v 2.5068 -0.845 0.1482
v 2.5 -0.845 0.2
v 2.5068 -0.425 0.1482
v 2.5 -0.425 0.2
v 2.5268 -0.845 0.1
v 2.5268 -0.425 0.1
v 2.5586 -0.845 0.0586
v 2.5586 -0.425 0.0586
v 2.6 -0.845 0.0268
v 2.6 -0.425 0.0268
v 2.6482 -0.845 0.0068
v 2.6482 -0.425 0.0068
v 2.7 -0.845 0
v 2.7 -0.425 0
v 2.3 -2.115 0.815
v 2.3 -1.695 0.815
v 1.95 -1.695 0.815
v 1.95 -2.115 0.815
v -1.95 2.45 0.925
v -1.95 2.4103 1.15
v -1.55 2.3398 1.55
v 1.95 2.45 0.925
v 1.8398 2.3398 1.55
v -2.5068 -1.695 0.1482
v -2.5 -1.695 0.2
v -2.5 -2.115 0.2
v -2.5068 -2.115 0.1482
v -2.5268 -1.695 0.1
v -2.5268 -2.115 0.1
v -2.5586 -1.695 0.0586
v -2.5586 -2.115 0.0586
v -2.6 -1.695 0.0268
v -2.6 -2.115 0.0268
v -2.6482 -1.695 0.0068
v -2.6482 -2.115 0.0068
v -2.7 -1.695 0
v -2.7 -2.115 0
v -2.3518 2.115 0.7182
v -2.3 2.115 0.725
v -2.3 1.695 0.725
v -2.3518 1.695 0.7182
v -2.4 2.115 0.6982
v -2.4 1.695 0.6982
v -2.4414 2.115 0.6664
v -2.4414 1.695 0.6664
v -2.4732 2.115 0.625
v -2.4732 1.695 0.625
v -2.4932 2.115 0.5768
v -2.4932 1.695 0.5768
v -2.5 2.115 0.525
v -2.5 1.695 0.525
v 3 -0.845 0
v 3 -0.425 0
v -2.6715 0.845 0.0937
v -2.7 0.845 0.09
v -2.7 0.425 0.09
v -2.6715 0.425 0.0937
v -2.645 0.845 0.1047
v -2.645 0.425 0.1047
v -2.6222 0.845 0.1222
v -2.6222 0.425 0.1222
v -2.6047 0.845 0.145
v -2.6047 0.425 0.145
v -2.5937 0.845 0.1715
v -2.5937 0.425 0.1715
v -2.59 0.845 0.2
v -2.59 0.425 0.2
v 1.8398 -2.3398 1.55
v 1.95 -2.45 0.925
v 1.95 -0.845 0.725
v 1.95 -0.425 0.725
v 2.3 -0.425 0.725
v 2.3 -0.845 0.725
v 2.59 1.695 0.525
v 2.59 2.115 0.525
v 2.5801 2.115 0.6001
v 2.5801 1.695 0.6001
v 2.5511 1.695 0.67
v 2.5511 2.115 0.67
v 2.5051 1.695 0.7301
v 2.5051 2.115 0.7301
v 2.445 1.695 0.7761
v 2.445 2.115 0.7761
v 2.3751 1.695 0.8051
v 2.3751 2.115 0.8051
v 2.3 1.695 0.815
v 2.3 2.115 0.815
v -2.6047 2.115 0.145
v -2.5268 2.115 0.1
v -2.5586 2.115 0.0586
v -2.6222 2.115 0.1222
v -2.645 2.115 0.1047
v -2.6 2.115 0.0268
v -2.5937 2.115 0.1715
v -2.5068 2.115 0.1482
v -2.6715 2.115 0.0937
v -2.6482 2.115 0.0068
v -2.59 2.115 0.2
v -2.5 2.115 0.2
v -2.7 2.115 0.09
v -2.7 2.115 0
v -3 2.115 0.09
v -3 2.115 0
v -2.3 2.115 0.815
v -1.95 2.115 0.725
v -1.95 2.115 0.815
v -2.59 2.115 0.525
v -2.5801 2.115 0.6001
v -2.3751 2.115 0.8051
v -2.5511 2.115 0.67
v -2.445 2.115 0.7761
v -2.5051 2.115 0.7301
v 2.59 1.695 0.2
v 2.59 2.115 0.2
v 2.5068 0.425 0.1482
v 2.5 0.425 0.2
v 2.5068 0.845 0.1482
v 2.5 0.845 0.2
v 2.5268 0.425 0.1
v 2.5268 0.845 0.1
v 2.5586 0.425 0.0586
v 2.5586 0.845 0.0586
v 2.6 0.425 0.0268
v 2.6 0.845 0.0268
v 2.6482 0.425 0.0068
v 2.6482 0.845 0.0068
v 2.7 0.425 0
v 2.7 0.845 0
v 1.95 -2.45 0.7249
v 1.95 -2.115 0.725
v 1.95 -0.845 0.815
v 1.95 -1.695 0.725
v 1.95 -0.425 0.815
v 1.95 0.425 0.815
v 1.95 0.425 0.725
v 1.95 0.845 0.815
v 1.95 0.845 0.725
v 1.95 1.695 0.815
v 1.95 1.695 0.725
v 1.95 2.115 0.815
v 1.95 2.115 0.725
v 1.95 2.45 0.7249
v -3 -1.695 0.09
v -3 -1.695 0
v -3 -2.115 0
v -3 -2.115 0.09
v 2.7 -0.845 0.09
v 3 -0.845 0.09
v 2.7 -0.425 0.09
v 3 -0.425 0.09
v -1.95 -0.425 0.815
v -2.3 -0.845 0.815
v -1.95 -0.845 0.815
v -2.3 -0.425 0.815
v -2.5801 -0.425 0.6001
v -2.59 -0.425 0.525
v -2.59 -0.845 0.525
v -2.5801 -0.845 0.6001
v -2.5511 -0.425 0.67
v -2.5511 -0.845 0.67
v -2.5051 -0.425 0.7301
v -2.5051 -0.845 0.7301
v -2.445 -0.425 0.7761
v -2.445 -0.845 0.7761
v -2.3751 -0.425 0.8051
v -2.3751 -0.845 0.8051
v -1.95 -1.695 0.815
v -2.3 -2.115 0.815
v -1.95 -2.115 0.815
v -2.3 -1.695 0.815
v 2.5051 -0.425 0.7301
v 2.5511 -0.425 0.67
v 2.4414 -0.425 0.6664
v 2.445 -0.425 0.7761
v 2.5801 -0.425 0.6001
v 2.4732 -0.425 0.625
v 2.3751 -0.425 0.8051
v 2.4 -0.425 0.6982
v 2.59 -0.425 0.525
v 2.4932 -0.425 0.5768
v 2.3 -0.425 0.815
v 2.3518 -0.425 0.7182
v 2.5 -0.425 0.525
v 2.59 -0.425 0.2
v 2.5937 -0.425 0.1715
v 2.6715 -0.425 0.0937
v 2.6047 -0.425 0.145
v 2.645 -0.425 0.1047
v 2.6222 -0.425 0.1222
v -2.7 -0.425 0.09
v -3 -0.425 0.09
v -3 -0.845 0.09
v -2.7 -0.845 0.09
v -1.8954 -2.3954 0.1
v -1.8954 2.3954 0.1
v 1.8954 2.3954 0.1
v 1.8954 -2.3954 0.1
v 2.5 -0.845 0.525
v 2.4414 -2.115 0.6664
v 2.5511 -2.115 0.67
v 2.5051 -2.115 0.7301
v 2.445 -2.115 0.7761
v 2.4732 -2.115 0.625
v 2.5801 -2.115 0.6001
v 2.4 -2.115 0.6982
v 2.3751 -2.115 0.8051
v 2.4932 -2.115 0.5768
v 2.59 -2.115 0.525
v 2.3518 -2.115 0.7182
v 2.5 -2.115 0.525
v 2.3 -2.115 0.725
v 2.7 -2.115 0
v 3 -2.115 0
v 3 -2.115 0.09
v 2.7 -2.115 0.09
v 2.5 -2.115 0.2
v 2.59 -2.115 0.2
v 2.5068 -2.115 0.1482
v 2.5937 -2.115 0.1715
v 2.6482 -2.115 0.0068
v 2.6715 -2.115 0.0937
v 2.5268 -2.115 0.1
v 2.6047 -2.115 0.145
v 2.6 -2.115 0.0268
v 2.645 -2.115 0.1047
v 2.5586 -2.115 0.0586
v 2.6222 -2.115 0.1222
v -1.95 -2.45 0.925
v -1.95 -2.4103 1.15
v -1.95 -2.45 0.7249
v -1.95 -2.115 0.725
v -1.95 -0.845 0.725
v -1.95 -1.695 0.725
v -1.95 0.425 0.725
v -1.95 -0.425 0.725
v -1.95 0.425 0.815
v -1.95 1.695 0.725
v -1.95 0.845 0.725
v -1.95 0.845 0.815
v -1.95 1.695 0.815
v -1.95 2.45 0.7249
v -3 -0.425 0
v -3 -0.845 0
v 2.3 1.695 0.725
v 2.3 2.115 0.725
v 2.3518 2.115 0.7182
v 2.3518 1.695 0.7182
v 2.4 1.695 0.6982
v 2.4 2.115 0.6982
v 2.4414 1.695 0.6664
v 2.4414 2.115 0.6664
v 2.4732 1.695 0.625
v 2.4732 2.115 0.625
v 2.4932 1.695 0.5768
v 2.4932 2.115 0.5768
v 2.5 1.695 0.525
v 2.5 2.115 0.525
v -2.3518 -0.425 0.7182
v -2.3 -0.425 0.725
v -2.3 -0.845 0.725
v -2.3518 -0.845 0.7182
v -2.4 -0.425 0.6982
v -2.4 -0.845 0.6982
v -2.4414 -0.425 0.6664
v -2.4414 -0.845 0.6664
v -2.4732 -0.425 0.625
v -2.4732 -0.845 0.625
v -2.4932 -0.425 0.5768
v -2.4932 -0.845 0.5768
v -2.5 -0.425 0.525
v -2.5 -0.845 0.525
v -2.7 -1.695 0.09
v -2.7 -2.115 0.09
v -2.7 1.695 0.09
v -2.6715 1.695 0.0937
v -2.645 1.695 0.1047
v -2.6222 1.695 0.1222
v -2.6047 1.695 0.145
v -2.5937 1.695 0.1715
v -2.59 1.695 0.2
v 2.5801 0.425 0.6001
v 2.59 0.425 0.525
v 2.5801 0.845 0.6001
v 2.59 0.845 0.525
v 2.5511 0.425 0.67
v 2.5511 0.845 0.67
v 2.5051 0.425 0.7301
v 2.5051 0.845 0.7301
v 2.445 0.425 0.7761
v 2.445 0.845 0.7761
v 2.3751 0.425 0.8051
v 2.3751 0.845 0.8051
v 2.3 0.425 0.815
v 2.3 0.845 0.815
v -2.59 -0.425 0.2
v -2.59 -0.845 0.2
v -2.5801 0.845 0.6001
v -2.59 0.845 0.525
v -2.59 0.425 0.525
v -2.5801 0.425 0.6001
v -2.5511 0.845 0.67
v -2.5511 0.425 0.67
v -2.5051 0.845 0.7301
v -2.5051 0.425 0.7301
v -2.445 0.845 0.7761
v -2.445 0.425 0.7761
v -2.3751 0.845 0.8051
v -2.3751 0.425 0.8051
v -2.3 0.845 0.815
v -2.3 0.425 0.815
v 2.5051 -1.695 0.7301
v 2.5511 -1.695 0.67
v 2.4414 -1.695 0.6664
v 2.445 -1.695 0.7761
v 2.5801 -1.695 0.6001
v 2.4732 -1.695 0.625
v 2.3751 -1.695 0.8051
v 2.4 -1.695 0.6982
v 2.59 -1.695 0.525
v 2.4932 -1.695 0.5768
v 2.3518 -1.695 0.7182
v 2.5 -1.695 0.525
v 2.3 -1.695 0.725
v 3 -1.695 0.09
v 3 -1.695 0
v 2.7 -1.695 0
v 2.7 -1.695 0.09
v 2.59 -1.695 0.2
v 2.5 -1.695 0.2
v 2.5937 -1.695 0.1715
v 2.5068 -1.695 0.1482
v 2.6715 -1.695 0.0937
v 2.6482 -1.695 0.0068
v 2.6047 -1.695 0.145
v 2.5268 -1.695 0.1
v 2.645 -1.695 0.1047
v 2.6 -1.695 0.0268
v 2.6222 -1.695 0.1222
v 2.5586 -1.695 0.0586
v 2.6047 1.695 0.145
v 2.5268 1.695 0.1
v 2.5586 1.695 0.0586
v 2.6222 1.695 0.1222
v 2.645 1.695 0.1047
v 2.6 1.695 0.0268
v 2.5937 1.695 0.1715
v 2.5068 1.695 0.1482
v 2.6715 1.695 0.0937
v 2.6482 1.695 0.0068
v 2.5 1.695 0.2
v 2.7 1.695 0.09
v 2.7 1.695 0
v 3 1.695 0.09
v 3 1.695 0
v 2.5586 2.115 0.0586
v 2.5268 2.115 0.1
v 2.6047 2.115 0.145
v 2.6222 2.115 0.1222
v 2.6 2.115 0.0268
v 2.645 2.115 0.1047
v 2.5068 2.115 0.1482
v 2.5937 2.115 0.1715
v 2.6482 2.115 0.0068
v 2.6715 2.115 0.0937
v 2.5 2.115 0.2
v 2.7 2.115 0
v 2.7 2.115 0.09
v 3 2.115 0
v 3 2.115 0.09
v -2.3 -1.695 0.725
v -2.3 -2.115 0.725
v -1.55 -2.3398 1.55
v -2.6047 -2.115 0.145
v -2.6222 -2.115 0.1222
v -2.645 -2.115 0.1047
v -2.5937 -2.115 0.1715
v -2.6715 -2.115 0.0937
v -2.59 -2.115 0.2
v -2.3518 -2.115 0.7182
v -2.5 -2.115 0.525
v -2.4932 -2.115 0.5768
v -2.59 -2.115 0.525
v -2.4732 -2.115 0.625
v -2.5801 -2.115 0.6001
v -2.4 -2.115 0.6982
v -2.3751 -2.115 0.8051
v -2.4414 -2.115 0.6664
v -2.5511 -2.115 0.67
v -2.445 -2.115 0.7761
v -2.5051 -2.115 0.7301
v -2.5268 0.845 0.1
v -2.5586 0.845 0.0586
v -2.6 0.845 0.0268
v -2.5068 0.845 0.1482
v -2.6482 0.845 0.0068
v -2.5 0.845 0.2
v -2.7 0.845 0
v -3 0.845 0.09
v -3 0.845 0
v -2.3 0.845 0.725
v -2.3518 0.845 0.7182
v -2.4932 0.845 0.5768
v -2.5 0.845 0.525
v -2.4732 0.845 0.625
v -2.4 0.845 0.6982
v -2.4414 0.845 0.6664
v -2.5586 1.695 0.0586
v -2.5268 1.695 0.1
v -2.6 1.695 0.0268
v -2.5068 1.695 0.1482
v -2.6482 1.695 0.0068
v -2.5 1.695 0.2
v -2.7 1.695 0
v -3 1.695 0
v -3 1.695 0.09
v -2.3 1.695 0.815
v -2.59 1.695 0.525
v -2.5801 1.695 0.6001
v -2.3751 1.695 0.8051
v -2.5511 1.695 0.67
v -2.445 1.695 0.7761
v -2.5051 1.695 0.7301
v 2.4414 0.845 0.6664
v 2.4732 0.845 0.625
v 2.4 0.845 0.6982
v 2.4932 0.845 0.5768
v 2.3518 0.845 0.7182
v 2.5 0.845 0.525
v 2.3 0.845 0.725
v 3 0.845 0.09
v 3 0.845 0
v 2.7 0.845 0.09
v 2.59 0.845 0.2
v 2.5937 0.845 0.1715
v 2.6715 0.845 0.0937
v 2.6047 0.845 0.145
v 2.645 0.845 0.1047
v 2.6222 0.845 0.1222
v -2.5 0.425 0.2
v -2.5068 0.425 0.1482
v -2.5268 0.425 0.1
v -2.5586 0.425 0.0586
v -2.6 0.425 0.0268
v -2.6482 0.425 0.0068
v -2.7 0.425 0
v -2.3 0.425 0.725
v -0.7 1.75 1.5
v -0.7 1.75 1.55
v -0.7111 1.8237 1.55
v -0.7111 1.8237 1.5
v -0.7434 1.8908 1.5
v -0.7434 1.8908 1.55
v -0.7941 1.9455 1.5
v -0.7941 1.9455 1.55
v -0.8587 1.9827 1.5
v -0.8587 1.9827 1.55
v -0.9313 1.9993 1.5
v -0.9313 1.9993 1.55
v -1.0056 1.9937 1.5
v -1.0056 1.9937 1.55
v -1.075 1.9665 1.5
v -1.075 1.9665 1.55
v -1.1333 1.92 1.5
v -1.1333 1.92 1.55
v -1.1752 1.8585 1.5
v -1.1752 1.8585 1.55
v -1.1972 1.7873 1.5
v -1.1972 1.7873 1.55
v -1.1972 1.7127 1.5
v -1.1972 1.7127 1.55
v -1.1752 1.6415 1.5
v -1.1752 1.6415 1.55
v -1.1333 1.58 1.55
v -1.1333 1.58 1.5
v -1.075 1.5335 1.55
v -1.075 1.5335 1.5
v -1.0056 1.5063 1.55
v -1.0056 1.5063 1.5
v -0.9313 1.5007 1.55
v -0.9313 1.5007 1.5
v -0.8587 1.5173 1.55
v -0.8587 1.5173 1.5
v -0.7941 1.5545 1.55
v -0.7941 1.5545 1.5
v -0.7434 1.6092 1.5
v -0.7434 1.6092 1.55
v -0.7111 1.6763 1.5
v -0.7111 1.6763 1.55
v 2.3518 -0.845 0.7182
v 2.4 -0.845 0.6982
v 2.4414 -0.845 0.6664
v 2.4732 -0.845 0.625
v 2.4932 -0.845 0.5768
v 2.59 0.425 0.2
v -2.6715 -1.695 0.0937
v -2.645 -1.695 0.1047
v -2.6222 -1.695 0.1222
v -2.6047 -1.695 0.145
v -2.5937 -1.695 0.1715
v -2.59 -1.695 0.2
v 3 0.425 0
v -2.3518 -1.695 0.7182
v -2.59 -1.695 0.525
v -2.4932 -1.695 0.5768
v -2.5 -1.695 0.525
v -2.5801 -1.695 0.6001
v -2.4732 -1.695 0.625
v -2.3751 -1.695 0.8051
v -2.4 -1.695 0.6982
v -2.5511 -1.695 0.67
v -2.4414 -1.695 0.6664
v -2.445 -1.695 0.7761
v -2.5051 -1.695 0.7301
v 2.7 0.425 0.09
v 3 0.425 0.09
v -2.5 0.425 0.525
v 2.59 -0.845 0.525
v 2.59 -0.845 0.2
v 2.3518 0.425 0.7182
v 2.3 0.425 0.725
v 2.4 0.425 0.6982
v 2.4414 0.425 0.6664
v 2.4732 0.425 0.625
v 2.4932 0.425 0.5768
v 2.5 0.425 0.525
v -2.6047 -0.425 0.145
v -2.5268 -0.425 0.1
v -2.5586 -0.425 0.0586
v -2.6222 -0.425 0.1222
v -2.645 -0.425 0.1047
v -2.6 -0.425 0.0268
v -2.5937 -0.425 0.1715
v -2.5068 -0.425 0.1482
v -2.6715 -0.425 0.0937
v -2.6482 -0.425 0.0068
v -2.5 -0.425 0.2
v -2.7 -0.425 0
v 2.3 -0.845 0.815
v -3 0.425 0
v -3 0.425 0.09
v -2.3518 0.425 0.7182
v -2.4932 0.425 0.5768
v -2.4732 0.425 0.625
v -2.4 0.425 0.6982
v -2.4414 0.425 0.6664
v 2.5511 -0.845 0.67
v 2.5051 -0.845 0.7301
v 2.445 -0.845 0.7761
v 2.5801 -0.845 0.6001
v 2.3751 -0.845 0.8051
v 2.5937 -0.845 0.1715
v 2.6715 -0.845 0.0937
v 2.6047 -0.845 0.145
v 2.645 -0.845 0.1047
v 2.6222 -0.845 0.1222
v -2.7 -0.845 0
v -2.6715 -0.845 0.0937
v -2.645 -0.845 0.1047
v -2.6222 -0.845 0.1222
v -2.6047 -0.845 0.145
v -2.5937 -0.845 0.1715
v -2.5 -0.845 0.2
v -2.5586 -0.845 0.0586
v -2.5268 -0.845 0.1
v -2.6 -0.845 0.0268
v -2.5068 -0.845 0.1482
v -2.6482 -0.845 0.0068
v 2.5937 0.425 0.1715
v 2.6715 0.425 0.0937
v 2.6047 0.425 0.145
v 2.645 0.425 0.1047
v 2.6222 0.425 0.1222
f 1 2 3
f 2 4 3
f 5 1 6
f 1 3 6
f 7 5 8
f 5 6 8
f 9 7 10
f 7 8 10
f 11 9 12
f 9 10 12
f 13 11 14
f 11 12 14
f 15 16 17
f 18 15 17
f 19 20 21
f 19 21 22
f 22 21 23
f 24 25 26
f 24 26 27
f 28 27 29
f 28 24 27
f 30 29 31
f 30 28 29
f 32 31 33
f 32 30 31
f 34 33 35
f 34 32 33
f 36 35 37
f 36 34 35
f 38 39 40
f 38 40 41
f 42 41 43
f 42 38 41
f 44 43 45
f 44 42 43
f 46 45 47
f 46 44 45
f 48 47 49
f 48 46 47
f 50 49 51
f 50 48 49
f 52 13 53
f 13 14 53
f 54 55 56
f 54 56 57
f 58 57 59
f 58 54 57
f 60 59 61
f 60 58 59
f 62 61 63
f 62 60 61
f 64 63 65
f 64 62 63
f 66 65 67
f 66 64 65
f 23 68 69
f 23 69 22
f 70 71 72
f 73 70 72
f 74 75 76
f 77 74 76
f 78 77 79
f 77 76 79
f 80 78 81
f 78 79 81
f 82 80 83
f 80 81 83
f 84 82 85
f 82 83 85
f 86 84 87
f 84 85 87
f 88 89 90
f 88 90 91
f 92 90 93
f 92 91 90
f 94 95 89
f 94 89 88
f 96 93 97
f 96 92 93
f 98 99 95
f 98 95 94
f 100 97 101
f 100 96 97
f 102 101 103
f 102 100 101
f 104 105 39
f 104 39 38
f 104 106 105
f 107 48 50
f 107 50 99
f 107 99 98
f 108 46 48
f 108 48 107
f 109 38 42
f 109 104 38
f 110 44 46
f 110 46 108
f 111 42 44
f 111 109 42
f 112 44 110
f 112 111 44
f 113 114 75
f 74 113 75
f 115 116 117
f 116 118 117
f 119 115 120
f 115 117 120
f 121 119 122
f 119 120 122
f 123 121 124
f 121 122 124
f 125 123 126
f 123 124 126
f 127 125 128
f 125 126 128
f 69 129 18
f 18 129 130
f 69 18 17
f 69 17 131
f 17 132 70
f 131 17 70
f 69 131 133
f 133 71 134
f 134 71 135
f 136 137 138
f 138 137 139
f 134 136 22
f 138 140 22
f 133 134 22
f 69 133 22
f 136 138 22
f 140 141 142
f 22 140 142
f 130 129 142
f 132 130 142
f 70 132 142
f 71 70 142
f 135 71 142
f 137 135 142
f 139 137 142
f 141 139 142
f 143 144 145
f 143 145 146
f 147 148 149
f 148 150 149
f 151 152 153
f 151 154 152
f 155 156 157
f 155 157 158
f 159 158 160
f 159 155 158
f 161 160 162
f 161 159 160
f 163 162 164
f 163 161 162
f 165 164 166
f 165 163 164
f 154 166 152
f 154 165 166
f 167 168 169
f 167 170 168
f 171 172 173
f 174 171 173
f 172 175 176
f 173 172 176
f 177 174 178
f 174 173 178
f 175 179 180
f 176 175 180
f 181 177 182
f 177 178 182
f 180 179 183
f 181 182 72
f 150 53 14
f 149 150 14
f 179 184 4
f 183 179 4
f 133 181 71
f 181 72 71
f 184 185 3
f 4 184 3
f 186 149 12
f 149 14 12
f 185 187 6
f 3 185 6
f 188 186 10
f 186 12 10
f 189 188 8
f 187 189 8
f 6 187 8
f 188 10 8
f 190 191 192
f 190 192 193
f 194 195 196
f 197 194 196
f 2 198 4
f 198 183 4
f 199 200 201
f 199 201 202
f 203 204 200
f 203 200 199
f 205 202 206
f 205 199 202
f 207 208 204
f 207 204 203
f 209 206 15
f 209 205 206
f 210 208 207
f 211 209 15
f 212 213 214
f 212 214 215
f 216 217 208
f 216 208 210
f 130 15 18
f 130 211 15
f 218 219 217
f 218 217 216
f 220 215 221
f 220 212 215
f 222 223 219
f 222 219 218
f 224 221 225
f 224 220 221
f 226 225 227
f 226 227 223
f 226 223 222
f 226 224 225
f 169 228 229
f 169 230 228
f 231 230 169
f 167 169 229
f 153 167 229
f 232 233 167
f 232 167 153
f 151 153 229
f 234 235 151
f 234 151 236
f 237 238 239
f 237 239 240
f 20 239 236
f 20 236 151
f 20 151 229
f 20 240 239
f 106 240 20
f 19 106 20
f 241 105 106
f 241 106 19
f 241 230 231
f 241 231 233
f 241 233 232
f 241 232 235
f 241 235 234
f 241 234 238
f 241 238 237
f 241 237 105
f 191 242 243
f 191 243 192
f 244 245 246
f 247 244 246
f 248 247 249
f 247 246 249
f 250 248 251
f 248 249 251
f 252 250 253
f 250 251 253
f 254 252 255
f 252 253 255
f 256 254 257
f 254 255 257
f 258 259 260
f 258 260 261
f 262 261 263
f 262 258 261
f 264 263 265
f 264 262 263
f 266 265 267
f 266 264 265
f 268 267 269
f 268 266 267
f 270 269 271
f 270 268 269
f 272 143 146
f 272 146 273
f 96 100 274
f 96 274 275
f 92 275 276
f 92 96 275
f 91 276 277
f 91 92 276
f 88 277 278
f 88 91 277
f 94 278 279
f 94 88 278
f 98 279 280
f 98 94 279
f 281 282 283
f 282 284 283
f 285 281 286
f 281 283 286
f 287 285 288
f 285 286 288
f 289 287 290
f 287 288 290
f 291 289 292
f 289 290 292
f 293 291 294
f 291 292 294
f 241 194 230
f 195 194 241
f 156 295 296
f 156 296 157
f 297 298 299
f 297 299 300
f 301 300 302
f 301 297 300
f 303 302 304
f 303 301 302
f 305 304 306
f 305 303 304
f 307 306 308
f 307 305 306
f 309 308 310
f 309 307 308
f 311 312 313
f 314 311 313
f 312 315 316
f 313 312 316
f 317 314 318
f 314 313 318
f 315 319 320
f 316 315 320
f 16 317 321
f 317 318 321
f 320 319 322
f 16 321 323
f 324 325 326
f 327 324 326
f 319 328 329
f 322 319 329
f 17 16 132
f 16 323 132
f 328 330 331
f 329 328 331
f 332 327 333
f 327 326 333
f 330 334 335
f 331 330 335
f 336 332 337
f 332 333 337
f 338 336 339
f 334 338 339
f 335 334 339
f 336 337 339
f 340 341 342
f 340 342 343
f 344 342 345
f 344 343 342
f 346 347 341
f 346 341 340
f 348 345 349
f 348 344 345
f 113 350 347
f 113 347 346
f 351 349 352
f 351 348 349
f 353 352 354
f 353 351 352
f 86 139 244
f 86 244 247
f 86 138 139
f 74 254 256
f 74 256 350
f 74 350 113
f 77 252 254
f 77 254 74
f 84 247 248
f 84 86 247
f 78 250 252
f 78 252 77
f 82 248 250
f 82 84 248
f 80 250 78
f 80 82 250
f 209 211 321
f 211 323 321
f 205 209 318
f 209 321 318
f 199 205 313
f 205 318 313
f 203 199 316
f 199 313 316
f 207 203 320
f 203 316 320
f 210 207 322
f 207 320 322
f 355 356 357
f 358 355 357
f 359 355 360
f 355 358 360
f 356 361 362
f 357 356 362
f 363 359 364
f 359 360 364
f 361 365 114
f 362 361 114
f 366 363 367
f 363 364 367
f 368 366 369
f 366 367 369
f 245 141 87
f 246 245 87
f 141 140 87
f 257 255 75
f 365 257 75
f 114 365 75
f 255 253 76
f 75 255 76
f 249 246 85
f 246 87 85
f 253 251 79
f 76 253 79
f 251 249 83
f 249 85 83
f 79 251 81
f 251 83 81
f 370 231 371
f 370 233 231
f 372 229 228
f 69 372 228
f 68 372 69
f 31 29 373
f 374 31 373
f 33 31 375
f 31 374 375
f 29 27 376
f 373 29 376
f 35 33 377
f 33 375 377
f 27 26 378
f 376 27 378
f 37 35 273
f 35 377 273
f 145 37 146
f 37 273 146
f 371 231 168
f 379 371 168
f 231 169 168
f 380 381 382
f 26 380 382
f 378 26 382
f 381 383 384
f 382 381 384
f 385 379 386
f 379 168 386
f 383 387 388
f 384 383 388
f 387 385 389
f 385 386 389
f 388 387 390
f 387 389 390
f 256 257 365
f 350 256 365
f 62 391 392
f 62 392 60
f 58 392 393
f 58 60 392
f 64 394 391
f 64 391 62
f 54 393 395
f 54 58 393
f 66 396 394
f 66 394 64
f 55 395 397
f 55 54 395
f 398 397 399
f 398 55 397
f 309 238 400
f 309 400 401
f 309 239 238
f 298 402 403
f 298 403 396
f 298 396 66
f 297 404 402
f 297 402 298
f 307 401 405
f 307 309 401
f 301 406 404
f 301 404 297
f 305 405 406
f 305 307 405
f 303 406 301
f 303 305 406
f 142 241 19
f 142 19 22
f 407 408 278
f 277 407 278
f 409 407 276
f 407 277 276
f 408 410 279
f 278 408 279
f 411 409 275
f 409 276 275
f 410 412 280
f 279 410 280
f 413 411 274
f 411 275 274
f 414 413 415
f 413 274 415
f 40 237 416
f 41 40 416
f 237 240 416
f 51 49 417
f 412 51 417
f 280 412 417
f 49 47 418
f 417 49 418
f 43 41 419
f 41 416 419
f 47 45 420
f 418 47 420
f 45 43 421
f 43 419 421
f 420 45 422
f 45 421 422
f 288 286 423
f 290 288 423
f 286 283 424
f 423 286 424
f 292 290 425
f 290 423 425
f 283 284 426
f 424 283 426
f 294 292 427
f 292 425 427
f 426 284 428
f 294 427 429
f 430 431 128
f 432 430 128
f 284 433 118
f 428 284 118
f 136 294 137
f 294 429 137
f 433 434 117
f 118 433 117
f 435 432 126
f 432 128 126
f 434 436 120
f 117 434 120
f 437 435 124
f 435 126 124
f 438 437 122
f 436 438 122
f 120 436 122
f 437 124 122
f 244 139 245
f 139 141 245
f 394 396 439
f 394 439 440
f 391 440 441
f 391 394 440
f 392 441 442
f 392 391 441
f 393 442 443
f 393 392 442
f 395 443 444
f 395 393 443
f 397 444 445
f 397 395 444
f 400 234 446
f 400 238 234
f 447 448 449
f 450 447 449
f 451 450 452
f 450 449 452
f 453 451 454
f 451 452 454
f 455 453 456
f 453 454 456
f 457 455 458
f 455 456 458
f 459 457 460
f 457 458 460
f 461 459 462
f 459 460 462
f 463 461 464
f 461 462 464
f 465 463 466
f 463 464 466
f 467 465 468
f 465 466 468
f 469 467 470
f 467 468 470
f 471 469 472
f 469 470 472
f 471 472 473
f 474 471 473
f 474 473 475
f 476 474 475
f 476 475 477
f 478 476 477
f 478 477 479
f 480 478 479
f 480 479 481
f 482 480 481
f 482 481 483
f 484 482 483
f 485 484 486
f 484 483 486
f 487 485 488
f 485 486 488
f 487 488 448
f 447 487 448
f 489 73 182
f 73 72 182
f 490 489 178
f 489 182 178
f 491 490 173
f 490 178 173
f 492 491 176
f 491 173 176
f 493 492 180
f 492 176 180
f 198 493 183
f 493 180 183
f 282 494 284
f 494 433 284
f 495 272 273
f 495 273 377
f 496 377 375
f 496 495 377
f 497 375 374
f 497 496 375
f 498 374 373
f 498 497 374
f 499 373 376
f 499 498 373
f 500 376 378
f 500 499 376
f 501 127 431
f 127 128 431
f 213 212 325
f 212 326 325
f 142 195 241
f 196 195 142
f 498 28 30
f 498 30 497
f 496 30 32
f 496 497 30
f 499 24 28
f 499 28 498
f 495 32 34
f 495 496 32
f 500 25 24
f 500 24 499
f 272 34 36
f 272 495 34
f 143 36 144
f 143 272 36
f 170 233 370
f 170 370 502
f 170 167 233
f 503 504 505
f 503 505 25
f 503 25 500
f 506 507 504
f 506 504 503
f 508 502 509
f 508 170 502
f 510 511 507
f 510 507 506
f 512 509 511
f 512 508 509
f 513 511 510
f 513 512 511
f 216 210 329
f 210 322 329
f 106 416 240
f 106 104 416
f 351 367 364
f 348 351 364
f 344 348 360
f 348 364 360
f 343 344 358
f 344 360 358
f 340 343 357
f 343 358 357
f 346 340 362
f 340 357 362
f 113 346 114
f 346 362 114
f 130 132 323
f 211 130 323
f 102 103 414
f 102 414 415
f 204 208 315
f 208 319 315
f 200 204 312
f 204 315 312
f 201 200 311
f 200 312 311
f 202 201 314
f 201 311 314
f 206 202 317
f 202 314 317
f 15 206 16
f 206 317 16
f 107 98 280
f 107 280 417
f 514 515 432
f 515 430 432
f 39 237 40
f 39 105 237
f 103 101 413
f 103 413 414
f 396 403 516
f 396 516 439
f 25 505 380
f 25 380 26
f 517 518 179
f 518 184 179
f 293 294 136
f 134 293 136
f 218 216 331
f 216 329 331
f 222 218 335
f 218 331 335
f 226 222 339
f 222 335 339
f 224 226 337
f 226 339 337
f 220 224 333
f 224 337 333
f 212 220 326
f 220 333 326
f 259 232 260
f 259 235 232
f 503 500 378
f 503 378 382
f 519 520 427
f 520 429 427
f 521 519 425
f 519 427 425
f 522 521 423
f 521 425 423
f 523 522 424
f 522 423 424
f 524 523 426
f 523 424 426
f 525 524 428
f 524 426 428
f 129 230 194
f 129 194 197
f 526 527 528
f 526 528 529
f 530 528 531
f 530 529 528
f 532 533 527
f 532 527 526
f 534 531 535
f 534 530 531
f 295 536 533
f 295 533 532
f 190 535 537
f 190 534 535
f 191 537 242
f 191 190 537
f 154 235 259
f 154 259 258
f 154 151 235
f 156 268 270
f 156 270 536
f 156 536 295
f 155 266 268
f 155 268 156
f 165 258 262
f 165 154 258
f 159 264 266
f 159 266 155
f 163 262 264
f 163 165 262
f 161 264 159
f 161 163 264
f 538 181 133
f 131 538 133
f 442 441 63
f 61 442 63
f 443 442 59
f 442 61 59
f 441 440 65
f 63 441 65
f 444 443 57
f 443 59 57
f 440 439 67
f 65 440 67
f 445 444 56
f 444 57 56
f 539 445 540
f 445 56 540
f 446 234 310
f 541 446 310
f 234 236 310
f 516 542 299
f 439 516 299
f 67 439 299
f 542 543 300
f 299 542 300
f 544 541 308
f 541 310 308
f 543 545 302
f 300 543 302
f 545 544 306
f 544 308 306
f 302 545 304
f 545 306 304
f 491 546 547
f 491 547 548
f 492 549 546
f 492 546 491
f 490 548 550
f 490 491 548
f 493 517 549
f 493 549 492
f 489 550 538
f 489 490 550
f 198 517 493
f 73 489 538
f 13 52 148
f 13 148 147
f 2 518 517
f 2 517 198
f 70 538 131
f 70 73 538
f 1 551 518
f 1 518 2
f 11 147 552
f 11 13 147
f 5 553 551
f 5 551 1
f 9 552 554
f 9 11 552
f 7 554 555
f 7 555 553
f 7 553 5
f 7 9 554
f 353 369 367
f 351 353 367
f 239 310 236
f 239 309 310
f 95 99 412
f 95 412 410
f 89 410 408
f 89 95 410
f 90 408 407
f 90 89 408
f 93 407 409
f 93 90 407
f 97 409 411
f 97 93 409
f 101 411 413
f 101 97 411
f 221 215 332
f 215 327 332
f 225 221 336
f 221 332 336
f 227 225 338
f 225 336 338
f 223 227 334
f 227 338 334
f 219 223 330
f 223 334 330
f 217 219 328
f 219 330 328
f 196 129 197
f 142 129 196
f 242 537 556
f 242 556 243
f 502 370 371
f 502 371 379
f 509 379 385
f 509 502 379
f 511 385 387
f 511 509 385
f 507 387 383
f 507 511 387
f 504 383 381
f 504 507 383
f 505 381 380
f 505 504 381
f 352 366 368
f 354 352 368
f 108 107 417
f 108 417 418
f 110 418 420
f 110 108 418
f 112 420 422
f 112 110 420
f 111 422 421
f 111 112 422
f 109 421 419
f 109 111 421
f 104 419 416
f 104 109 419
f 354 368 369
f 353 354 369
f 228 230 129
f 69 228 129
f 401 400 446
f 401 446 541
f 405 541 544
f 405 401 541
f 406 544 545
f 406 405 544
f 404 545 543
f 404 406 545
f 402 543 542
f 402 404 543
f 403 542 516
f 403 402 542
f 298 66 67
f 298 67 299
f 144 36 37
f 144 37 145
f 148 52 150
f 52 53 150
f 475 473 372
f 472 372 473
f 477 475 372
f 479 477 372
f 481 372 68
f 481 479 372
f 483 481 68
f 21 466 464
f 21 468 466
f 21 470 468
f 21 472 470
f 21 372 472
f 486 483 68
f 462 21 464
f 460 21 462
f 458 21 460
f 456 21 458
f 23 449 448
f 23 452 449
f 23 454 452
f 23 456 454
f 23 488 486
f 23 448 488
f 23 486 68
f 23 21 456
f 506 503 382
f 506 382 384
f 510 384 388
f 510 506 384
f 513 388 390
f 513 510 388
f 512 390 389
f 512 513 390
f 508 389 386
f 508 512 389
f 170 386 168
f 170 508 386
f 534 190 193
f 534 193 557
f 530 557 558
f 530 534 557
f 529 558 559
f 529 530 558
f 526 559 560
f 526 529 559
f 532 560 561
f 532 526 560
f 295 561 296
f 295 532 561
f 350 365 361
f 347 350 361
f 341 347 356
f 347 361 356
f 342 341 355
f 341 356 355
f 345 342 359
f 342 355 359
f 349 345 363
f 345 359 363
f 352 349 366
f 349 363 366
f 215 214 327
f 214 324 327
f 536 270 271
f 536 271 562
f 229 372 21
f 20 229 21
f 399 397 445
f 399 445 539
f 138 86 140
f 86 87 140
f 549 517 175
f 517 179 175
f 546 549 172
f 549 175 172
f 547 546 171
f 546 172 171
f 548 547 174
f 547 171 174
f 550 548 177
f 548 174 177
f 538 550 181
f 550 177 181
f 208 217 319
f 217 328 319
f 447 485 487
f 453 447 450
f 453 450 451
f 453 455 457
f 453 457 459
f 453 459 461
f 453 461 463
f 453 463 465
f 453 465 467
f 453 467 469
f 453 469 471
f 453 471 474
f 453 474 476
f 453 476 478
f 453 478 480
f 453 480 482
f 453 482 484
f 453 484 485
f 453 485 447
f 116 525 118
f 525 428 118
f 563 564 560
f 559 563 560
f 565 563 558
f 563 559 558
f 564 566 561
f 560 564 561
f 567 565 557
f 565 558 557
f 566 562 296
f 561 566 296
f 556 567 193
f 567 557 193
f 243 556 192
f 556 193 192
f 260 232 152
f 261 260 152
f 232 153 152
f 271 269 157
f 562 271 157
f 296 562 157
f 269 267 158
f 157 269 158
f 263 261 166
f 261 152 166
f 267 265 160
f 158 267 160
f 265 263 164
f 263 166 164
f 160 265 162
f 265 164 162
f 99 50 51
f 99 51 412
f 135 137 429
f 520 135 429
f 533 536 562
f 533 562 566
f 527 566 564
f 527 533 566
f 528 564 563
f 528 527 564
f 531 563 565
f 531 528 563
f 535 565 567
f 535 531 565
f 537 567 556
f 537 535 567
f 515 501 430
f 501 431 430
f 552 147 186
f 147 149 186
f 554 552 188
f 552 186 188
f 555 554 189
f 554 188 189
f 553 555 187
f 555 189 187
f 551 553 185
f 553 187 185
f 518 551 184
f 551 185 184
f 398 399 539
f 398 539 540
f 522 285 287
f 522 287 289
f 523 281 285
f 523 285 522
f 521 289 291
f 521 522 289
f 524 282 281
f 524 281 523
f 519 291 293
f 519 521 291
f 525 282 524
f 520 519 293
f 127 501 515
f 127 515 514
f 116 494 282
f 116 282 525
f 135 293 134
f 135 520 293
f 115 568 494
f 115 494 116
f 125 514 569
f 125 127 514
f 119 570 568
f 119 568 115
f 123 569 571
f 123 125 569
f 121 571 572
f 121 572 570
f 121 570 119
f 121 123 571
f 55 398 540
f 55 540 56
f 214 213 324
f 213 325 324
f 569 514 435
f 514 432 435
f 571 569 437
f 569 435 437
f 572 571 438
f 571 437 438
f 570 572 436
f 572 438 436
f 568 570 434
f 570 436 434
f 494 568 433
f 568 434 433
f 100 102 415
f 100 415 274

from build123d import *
from OCP.BRepFilletAPI import BRepFilletAPI_MakeChamfer

# Parameters (mm, degrees)
ESQUISSE2_W              = 3.9
ESQUISSE2_H              = 4.9
CORP_DEPTH               = 1.45
PIN_1_DEPTH              = 0.21
R_P_TITION_PIN_1_4_COUNT = 4
R_P_TITION_PIN_1_4_PITCH = 1.27
SYM_TRIE1_COPY_1_DEPTH   = 0.21
SYM_TRIE1_COPY_2_DEPTH   = 0.21
SYM_TRIE1_COPY_3_DEPTH   = 0.21
CHANFREIN4_SIZE          = 0.625
CHANFREIN4_SIZE2         = 0.110204363
CHANFREIN5_SIZE          = 0.625
CHANFREIN5_SIZE_2        = 0.054680415
ESQUISSE8_R              = 0.25
ENL_V_MAT_EXTRU_1_DEPTH  = 0.05
CHANFREIN7_SIZE          = 0.4


with BuildPart() as part:
    # Esquisse2 → corp (new body)
    with BuildSketch(Plane.XY.offset(0.1)):
        Rectangle(ESQUISSE2_W, ESQUISSE2_H)
    extrude(amount=CORP_DEPTH)

    # Esquisse6 → pin 1 (add, symmetric)
    with BuildSketch(Plane(origin=(0, 1.905, 0), x_dir=(-1, 0, 0), z_dir=(0, 1, 0))):
        with BuildLine():
            Line((1.95, 0.725), (2.3, 0.725))
            ThreePointArc((2.3, 0.725), (2.441421356, 0.666421356), (2.5, 0.525))
            Line((2.5, 0.525), (2.5, 0.2))
            ThreePointArc((2.5, 0.2), (2.558578644, 0.058578644), (2.7, 0))
            Line((2.7, 0), (3, 0))
            Line((3, 0), (3, 0.09))
            Line((3, 0.09), (2.7, 0.09))
            ThreePointArc((2.7, 0.09), (2.622218254, 0.122218254), (2.59, 0.2))
            Line((2.59, 0.2), (2.59, 0.525))
            ThreePointArc((2.59, 0.525), (2.505060967, 0.730060967), (2.3, 0.815))
            Line((2.3, 0.815), (1.95, 0.815))
            Line((1.95, 0.815), (1.95, 0.725))
        make_face()
    pin_1 = extrude(amount=PIN_1_DEPTH, both=True)

    # Répétition pin 1-4: pin 1 ×4
    with Locations(*[(0, -i * R_P_TITION_PIN_1_4_PITCH, 0) for i in range(1, R_P_TITION_PIN_1_4_COUNT)]):
        add(pin_1)

    # Symétrie1: pin 1 across plane
    add(pin_1.mirror(Plane(origin=(0, 0, 0), x_dir=(0, 0, 1), z_dir=(1, 0, 0))))

    # Symétrie1 copy 1 sketch → Symétrie1 copy 1 (add, symmetric)
    with BuildSketch(Plane(origin=(0, 0.635, 0), x_dir=(1, 0, 0), z_dir=(0, 1, 0))):
        with BuildLine():
            Line((1.95, -0.725), (2.3, -0.725))
            ThreePointArc((2.3, -0.725), (2.441421356, -0.666421356), (2.5, -0.525))
            Line((2.5, -0.525), (2.5, -0.2))
            ThreePointArc((2.5, -0.2), (2.558578644, -0.058578644), (2.7, 0))
            Line((2.7, 0), (3, 0))
            Line((3, 0), (3, -0.09))
            Line((3, -0.09), (2.7, -0.09))
            ThreePointArc((2.7, -0.09), (2.622218254, -0.122218254), (2.59, -0.2))
            Line((2.59, -0.2), (2.59, -0.525))
            ThreePointArc((2.59, -0.525), (2.505060967, -0.730060967), (2.3, -0.815))
            Line((2.3, -0.815), (1.95, -0.815))
            Line((1.95, -0.815), (1.95, -0.725))
        make_face()
    extrude(amount=SYM_TRIE1_COPY_1_DEPTH, both=True)

    # Symétrie1 copy 2 sketch → Symétrie1 copy 2 (add, symmetric)
    with BuildSketch(Plane(origin=(0, -0.635, 0), x_dir=(1, 0, 0), z_dir=(0, 1, 0))):
        with BuildLine():
            Line((1.95, -0.725), (2.3, -0.725))
            ThreePointArc((2.3, -0.725), (2.441421356, -0.666421356), (2.5, -0.525))
            Line((2.5, -0.525), (2.5, -0.2))
            ThreePointArc((2.5, -0.2), (2.558578644, -0.058578644), (2.7, 0))
            Line((2.7, 0), (3, 0))
            Line((3, 0), (3, -0.09))
            Line((3, -0.09), (2.7, -0.09))
            ThreePointArc((2.7, -0.09), (2.622218254, -0.122218254), (2.59, -0.2))
            Line((2.59, -0.2), (2.59, -0.525))
            ThreePointArc((2.59, -0.525), (2.505060967, -0.730060967), (2.3, -0.815))
            Line((2.3, -0.815), (1.95, -0.815))
            Line((1.95, -0.815), (1.95, -0.725))
        make_face()
    extrude(amount=SYM_TRIE1_COPY_2_DEPTH, both=True)

    # Symétrie1 copy 3 sketch → Symétrie1 copy 3 (add, symmetric)
    with BuildSketch(Plane(origin=(0, -1.905, 0), x_dir=(1, 0, 0), z_dir=(0, 1, 0))):
        with BuildLine():
            Line((1.95, -0.725), (2.3, -0.725))
            ThreePointArc((2.3, -0.725), (2.441421356, -0.666421356), (2.5, -0.525))
            Line((2.5, -0.525), (2.5, -0.2))
            ThreePointArc((2.5, -0.2), (2.558578644, -0.058578644), (2.7, 0))
            Line((2.7, 0), (3, 0))
            Line((3, 0), (3, -0.09))
            Line((3, -0.09), (2.7, -0.09))
            ThreePointArc((2.7, -0.09), (2.622218254, -0.122218254), (2.59, -0.2))
            Line((2.59, -0.2), (2.59, -0.525))
            ThreePointArc((2.59, -0.525), (2.505060967, -0.730060967), (2.3, -0.815))
            Line((2.3, -0.815), (1.95, -0.815))
            Line((1.95, -0.815), (1.95, -0.725))
        make_face()
    extrude(amount=SYM_TRIE1_COPY_3_DEPTH, both=True)

    # Chanfrein4: one chamfer whose edges measure the first distance from different faces: ONE call of the kernel's chamfer builder (chamfer() names one face for all edges)
    chanfrein4_edges_1 = [part.edges().sort_by_distance(p)[0] for p in [
        (1.95, 0, 1.55),
    ]]
    chanfrein4_side_1 = [part.faces().sort_by_distance(p)[0] for p in [
        (1.95, 0, 0.826195893),
    ]]
    chanfrein4_edges_2 = [part.edges().sort_by_distance(p)[0] for p in [
        (0, 2.45, 1.55),
    ]]
    chanfrein4_side_2 = [part.faces().sort_by_distance(p)[0] for p in [
        (0, 2.45, 0.825),
    ]]
    chanfrein4_edges_3 = [part.edges().sort_by_distance(p)[0] for p in [
        (0, -2.45, 1.55),
    ]]
    chanfrein4_side_3 = [part.faces().sort_by_distance(p)[0] for p in [
        (0, -2.45, 0.825),
    ]]
    chanfrein4 = BRepFilletAPI_MakeChamfer(part.part.solid().wrapped)
    for e in chanfrein4_edges_1:
        chanfrein4.Add(CHANFREIN4_SIZE, CHANFREIN4_SIZE2, e.wrapped, chanfrein4_side_1[0].wrapped)  # the first distance lies on this face
    for e in chanfrein4_edges_2:
        chanfrein4.Add(CHANFREIN4_SIZE, CHANFREIN4_SIZE2, e.wrapped, chanfrein4_side_2[0].wrapped)  # the first distance lies on this face
    for e in chanfrein4_edges_3:
        chanfrein4.Add(CHANFREIN4_SIZE, CHANFREIN4_SIZE2, e.wrapped, chanfrein4_side_3[0].wrapped)  # the first distance lies on this face
    add(Compound.cast(chanfrein4.Shape()), mode=Mode.REPLACE)

    # Chanfrein5
    chanfrein5_edges_1 = [part.edges().sort_by_distance(p)[0] for p in [
        (0, 2.45, 0.1),
    ]]
    chanfrein5_side_1 = [part.faces().sort_by_distance(p)[0] for p in [
        (0, 2.45, 0.101093608),
    ]]
    chanfrein5_edges_2 = [part.edges().sort_by_distance(p)[0] for p in [
        (1.95, 0, 0.1),
    ]]
    chanfrein5_side_2 = [part.faces().sort_by_distance(p)[0] for p in [
        (1.948906392, 0, 0.1),
    ]]
    chanfrein5_edges_3 = [part.edges().sort_by_distance(p)[0] for p in [
        (0, -2.45, 0.1),
    ]]
    chanfrein5_side_3 = [part.faces().sort_by_distance(p)[0] for p in [
        (0, -2.448906392, 0.1),
    ]]
    chanfrein5_edges_4 = [part.edges().sort_by_distance(p)[0] for p in [
        (-1.95, 0, 0.1),
    ]]
    chanfrein5_side_4 = [part.faces().sort_by_distance(p)[0] for p in [
        (-1.95, 0, 0.101093608),
    ]]
    chanfrein5 = BRepFilletAPI_MakeChamfer(part.part.solid().wrapped)
    for e in chanfrein5_edges_1:
        chanfrein5.Add(CHANFREIN5_SIZE - 0.0001, CHANFREIN5_SIZE_2 - 0.0001, e.wrapped, chanfrein5_side_1[0].wrapped)
    for e in chanfrein5_edges_2:
        chanfrein5.Add(CHANFREIN5_SIZE_2 - 0.0001, CHANFREIN5_SIZE - 0.0001, e.wrapped, chanfrein5_side_2[0].wrapped)
    for e in chanfrein5_edges_3:
        chanfrein5.Add(CHANFREIN5_SIZE_2 - 0.0001, CHANFREIN5_SIZE - 0.0001, e.wrapped, chanfrein5_side_3[0].wrapped)
    for e in chanfrein5_edges_4:
        chanfrein5.Add(CHANFREIN5_SIZE - 0.0001, CHANFREIN5_SIZE_2 - 0.0001, e.wrapped, chanfrein5_side_4[0].wrapped)
    add(Compound.cast(chanfrein5.Shape()), mode=Mode.REPLACE)  # a hair under: the kernel refuses the full size

    # Esquisse8 → Enlèv. mat.-Extru.1 (cut)
    with BuildSketch(Plane.XY.offset(1.55)):
        with Locations((-0.95, 1.75)):
            Circle(ESQUISSE8_R)
    extrude(amount=-ENL_V_MAT_EXTRU_1_DEPTH, mode=Mode.SUBTRACT)

    # Chanfrein7
    chanfrein7_edges = [part.edges().sort_by_distance(p)[0] for p in [
        (-1.95, 0, 1.55),
    ]]
    chamfer(chanfrein7_edges, length=CHANFREIN7_SIZE)


solid = part.part
